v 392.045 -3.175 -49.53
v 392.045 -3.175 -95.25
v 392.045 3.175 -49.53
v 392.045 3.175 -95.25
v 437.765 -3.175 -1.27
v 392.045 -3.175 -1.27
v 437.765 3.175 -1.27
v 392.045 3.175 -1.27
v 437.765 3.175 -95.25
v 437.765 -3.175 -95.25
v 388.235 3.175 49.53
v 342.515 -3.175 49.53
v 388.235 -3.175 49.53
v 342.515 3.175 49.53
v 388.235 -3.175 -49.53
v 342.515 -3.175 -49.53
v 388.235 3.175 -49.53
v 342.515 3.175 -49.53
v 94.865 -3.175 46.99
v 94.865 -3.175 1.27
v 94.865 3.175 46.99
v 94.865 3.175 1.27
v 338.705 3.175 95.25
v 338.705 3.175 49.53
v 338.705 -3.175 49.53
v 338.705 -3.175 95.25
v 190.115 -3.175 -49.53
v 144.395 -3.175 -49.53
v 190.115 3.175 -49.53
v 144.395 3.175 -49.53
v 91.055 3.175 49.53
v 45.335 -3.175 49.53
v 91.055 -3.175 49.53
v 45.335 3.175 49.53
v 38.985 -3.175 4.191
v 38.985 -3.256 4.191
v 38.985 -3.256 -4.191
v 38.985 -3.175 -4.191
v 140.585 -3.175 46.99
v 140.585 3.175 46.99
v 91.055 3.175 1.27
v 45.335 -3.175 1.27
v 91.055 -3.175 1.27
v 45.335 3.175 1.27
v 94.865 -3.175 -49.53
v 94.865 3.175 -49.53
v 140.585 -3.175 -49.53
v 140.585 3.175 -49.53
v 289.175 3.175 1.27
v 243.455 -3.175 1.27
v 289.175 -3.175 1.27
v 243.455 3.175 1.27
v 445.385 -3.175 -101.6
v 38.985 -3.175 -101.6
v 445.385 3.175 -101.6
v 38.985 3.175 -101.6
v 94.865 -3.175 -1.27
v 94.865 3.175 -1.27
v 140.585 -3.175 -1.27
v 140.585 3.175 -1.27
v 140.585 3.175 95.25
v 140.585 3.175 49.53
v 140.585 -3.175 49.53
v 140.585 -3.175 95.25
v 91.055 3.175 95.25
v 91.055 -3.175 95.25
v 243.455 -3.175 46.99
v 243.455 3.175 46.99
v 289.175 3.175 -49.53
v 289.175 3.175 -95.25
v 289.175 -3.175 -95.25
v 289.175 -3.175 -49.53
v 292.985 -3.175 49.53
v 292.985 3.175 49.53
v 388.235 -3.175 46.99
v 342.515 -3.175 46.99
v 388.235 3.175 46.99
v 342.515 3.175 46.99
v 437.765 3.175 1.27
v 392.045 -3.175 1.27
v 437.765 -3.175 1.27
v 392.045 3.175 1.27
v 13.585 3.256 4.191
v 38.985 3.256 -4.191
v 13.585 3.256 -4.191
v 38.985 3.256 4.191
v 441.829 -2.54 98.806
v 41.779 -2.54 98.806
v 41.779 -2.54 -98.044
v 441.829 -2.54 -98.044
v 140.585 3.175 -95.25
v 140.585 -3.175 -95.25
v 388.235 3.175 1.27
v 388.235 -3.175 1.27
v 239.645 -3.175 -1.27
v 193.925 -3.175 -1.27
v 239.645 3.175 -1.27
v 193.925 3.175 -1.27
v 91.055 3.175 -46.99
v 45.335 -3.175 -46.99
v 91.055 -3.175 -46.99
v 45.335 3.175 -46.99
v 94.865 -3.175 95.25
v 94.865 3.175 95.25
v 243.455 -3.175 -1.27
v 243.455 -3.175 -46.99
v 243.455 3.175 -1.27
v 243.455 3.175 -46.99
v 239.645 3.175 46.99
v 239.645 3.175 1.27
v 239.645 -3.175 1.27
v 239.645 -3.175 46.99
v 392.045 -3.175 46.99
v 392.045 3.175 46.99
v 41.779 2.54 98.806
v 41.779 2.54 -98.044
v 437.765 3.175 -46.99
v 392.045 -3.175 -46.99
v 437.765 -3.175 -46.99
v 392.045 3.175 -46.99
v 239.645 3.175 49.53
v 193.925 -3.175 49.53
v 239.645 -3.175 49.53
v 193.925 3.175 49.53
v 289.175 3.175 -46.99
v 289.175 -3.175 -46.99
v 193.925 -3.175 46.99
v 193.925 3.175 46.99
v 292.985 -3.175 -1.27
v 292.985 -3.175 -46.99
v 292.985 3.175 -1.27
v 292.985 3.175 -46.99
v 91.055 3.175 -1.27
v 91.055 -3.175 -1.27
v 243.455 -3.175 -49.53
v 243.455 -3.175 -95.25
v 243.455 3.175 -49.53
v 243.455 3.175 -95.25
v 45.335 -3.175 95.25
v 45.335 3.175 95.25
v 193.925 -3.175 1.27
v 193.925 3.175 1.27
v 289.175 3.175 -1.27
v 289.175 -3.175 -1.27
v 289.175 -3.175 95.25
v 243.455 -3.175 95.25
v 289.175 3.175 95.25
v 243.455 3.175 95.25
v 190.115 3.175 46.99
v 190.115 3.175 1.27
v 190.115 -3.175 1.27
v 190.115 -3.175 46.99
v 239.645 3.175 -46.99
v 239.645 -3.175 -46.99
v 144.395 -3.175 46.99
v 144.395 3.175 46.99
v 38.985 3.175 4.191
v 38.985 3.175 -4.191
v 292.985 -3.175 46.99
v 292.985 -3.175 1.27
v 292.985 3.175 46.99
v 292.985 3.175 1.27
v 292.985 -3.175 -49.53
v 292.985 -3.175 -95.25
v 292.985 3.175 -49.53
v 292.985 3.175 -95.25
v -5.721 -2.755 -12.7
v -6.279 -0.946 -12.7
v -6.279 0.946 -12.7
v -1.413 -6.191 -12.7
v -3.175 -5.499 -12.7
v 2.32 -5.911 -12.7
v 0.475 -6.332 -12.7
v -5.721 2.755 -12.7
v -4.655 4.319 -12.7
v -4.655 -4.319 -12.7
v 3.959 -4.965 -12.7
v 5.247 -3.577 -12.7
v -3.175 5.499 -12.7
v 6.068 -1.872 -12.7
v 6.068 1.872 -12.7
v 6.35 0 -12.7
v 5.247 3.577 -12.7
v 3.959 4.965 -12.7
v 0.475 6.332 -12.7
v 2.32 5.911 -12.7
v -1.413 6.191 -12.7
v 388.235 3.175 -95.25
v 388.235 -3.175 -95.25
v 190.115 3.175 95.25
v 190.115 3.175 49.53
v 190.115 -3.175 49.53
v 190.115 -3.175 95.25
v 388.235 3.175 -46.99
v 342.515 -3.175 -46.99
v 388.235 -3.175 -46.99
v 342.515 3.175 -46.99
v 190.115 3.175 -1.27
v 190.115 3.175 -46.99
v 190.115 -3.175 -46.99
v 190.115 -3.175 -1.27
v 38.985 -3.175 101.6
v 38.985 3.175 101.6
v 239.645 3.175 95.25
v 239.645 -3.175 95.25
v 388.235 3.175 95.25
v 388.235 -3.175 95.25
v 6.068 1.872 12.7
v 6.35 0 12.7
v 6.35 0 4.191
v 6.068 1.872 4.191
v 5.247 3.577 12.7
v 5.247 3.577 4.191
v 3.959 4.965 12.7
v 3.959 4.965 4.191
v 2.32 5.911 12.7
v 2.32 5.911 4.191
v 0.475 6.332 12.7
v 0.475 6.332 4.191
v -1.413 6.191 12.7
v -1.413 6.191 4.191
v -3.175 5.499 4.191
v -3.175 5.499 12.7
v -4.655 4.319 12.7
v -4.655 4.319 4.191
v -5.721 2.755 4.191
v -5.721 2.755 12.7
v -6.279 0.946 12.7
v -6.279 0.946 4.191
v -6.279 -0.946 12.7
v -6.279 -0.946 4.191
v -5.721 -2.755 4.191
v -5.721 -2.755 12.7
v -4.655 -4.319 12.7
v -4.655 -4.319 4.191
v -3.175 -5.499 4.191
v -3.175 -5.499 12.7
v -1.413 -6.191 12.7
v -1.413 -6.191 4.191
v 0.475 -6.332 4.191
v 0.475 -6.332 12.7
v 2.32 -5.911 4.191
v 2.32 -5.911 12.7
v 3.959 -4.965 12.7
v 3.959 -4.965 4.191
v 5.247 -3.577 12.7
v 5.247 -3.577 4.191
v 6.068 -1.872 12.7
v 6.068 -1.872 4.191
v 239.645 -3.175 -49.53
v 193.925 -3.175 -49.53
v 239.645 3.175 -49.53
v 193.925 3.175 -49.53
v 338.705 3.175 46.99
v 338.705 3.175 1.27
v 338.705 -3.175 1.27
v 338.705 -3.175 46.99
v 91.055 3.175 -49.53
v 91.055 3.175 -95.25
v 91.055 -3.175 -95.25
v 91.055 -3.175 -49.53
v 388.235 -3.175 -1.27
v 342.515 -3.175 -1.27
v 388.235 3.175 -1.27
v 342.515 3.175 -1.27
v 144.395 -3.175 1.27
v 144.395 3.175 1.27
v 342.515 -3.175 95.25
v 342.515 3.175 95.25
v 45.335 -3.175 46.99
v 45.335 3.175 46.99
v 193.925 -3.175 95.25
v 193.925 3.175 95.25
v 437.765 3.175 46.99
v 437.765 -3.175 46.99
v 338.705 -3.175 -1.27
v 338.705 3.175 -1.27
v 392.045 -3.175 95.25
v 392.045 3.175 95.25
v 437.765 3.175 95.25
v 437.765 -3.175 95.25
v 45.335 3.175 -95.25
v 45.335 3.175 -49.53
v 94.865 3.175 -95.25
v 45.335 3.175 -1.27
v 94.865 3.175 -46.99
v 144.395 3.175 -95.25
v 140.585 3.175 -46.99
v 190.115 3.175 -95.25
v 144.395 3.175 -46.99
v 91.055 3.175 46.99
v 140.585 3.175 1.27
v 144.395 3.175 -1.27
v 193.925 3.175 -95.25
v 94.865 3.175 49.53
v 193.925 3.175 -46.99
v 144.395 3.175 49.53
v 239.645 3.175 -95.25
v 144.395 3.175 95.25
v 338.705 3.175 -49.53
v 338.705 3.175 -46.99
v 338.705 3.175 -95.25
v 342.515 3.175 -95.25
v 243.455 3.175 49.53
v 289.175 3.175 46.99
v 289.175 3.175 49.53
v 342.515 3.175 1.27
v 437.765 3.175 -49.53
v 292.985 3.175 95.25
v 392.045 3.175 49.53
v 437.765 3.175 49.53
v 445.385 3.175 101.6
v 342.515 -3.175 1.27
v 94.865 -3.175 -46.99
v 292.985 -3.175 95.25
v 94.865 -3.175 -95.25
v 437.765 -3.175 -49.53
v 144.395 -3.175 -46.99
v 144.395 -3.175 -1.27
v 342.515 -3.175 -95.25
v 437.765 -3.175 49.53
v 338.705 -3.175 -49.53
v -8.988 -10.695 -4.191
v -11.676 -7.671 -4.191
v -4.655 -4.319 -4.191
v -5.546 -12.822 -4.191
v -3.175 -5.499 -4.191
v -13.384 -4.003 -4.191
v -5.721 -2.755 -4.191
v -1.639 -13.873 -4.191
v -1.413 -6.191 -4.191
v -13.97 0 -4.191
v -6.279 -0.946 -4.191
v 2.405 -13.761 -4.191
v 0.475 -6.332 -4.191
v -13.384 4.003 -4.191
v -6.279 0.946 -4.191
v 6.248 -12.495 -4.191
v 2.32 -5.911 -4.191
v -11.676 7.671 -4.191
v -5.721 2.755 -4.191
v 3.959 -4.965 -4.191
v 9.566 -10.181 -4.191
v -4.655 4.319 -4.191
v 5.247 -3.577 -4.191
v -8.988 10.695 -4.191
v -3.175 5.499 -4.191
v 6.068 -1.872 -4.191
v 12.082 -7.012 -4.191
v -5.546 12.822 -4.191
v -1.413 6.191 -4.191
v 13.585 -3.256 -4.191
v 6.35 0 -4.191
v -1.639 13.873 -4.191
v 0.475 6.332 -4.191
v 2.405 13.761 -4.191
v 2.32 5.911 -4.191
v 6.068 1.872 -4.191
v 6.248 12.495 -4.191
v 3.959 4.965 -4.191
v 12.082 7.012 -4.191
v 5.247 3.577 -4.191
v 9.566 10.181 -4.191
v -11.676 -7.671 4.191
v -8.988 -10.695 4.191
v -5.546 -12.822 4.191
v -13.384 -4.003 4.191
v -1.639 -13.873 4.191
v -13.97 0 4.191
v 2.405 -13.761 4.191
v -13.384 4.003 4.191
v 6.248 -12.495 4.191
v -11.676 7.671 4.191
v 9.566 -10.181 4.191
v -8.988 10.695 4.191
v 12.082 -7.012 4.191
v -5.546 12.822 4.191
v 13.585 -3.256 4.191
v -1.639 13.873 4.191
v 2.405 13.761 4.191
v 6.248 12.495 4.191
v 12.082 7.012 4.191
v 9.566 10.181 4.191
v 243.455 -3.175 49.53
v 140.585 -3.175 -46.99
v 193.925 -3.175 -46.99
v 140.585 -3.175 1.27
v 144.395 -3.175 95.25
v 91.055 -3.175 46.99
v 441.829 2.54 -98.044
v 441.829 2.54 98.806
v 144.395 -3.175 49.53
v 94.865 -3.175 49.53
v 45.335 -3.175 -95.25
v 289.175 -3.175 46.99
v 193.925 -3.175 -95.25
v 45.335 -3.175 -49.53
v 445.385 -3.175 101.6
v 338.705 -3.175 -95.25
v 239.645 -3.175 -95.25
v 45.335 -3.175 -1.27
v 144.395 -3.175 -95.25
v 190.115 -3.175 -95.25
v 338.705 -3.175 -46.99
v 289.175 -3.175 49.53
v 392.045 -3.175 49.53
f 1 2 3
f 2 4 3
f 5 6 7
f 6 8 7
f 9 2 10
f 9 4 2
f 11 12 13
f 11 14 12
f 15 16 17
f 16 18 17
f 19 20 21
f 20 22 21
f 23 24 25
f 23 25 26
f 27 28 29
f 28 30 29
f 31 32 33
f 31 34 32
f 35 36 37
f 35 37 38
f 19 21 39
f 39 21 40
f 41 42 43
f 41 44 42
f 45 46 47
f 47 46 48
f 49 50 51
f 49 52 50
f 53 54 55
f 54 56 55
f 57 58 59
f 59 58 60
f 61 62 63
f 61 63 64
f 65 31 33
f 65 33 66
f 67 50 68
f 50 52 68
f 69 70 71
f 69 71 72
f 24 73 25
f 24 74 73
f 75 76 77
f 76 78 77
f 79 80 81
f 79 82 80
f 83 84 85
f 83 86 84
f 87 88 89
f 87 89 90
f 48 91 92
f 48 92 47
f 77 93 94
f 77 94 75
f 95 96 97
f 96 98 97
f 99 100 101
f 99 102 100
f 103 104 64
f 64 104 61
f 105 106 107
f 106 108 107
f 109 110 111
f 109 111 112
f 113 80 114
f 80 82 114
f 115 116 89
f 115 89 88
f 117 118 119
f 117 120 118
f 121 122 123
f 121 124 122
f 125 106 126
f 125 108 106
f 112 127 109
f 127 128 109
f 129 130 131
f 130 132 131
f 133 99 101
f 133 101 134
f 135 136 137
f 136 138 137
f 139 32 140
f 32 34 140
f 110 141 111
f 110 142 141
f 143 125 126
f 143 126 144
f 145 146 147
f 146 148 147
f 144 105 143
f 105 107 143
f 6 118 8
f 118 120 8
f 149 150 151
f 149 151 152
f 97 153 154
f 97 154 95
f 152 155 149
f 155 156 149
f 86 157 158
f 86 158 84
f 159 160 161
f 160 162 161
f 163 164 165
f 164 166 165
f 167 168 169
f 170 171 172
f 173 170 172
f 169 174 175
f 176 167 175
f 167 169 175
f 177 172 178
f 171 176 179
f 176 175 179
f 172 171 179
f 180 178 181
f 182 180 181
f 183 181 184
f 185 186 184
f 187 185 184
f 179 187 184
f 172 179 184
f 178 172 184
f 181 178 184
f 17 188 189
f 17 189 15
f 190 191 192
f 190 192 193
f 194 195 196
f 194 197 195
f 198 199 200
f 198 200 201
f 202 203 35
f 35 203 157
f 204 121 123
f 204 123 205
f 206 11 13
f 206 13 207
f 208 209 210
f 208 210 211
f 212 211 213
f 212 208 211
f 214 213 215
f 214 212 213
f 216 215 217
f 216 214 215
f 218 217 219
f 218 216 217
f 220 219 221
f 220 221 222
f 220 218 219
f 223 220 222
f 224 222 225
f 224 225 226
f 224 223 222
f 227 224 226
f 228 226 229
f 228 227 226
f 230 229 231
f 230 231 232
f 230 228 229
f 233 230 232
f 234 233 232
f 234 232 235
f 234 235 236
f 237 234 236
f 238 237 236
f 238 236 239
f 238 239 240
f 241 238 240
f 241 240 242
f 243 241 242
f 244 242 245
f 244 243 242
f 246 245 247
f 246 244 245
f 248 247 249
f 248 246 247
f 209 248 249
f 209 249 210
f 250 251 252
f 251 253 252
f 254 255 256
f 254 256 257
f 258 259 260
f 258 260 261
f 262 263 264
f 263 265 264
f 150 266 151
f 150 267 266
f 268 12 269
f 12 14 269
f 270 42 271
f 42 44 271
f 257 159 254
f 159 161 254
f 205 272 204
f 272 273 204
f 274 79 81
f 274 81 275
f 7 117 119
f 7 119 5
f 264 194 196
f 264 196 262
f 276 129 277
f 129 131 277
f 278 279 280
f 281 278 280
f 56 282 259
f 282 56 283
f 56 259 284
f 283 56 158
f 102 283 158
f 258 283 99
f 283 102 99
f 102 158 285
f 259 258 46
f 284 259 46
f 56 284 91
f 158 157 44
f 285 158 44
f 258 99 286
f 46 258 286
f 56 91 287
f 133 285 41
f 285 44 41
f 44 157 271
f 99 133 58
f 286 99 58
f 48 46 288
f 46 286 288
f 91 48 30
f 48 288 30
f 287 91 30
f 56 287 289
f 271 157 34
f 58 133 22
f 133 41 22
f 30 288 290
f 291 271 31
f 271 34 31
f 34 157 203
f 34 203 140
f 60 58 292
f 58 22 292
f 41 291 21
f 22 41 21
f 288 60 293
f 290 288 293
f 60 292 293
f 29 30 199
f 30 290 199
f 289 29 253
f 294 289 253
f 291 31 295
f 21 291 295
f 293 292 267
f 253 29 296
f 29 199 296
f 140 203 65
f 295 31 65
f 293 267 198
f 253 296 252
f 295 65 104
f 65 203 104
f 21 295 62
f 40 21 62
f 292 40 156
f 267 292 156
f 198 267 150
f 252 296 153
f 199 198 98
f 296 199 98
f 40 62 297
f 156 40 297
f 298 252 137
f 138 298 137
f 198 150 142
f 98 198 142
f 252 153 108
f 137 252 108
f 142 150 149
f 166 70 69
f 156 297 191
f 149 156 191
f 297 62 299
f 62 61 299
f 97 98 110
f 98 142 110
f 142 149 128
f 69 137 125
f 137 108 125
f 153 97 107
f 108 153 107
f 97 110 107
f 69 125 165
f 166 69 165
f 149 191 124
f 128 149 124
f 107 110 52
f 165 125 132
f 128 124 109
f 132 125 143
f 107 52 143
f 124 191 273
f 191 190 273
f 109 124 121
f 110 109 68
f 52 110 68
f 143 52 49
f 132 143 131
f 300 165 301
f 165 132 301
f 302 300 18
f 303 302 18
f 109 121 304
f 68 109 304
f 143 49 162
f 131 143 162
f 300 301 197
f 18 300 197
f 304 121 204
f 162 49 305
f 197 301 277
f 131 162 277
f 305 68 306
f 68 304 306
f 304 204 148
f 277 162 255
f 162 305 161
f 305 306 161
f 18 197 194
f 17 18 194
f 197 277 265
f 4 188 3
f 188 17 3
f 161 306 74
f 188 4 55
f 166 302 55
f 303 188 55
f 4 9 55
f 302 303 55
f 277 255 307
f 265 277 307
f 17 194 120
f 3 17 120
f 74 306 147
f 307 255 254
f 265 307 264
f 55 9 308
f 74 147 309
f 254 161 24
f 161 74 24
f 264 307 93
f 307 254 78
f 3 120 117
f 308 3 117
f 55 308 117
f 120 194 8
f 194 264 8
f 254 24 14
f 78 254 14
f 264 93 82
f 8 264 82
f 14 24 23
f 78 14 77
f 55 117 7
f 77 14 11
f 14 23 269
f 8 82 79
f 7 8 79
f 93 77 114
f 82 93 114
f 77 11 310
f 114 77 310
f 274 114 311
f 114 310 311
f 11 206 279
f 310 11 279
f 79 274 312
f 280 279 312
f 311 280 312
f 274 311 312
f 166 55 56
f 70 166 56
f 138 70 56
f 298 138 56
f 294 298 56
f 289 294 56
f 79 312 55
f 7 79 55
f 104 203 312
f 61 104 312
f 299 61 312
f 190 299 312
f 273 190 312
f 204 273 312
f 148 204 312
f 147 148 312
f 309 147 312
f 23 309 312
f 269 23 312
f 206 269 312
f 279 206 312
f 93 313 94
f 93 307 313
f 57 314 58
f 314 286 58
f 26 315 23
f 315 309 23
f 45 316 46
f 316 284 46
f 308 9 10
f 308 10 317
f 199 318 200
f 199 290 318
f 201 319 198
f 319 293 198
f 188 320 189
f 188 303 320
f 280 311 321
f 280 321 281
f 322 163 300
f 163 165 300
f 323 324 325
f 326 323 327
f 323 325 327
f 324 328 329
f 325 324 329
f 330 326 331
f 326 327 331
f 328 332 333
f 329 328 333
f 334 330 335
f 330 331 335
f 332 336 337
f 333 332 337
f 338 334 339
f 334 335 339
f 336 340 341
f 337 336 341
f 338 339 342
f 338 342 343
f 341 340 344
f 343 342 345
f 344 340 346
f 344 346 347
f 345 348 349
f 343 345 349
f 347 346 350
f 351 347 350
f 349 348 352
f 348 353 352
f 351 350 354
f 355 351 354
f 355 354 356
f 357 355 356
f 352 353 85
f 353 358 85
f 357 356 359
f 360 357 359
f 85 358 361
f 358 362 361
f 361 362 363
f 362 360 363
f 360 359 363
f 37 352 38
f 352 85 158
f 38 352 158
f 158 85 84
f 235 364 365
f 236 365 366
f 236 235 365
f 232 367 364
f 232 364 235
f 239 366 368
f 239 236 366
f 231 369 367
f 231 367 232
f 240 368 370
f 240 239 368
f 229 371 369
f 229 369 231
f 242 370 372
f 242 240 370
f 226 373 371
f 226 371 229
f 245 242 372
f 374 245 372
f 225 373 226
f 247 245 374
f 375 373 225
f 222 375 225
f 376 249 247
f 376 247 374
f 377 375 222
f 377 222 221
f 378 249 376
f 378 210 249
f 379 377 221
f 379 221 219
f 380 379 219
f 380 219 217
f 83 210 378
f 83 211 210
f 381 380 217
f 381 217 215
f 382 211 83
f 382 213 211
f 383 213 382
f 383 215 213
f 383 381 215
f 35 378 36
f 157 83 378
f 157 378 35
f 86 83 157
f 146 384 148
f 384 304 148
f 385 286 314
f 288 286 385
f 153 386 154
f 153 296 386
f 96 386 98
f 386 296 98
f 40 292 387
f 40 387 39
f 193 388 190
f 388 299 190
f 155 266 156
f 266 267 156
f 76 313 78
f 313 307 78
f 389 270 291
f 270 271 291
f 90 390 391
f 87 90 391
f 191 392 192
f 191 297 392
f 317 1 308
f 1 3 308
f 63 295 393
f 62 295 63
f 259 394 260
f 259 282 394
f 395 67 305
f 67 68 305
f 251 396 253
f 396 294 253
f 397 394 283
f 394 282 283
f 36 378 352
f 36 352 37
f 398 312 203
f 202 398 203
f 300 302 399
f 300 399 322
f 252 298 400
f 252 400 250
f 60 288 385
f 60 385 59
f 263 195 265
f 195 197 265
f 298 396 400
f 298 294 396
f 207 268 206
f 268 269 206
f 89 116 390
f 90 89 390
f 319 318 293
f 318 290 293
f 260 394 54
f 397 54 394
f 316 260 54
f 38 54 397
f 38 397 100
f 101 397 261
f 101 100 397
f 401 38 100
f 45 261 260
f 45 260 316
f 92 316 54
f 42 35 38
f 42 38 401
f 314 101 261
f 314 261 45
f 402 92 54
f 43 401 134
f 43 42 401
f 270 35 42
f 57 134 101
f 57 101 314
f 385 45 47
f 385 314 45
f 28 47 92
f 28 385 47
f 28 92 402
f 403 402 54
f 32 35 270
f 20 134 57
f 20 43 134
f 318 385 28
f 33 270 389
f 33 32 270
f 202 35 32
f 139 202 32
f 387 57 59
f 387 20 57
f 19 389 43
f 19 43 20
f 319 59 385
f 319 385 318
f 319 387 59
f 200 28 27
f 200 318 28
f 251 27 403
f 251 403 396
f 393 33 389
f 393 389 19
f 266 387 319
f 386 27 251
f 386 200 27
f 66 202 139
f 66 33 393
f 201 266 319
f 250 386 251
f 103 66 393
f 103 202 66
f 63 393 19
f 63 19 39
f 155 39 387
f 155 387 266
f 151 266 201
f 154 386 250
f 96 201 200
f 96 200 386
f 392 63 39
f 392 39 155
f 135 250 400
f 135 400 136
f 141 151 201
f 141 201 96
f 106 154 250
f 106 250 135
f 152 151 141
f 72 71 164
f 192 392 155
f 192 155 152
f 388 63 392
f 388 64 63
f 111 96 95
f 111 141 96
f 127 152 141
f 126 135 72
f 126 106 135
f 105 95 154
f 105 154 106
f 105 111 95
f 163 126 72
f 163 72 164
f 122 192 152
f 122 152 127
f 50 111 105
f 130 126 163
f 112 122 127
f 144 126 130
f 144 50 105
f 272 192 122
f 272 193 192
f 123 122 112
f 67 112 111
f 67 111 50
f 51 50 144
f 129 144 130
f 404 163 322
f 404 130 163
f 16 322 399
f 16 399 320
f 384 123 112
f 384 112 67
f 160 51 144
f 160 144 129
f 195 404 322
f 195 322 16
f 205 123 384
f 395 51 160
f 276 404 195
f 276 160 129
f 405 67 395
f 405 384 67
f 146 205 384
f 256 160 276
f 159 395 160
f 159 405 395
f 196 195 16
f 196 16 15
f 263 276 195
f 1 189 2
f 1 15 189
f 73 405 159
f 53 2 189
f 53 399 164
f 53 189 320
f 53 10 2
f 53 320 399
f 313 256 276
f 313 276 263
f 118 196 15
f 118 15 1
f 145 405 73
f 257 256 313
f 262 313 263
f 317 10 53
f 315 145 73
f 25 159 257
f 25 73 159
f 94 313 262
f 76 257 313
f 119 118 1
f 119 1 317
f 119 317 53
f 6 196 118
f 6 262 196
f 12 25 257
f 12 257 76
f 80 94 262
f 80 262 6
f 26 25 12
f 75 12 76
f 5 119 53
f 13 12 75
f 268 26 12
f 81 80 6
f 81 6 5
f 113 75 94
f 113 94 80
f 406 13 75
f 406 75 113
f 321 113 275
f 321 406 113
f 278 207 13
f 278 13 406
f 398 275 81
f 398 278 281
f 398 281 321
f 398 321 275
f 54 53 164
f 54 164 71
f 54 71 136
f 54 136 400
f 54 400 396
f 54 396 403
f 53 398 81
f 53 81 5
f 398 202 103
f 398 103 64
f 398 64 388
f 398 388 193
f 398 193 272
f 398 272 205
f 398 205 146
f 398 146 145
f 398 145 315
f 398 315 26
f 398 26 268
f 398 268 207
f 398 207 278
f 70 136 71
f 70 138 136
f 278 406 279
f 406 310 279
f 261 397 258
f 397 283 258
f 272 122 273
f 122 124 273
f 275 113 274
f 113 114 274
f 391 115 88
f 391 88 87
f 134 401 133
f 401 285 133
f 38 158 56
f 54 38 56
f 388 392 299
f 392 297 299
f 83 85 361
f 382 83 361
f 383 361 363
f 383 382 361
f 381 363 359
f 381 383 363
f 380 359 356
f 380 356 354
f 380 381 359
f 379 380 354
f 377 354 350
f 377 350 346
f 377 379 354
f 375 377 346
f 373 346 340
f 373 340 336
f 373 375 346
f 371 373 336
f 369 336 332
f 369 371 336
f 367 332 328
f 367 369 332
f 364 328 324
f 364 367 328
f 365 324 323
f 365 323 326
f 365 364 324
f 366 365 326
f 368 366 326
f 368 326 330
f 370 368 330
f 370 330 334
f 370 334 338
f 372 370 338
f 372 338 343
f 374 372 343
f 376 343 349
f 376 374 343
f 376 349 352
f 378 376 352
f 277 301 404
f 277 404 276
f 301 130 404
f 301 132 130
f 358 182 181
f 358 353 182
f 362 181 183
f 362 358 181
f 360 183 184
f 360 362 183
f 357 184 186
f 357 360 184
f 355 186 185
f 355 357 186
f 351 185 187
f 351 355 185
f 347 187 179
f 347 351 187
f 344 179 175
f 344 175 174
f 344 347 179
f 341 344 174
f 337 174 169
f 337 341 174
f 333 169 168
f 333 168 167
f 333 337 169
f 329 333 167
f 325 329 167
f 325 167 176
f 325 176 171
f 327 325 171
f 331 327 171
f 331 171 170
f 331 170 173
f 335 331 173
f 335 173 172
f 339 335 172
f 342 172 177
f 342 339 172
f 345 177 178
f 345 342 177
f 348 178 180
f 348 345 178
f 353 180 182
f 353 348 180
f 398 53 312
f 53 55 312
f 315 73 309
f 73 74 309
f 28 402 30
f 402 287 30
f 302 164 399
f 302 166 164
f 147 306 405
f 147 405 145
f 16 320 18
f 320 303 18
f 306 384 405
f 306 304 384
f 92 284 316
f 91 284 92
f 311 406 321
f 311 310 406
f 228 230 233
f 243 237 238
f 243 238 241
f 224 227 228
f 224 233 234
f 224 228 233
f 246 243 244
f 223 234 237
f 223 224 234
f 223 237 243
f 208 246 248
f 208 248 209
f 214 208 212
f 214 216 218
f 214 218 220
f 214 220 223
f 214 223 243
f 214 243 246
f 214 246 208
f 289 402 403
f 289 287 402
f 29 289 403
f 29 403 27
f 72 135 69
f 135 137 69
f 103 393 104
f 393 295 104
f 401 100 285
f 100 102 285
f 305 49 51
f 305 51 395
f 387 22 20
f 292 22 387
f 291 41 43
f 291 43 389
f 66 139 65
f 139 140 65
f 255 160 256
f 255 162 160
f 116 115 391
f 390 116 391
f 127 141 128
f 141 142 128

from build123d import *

# Parameters (mm, degrees)
F0_R      = 6.35
F1_DEPTH  = 12.7
F2_R      = 6.35
F3_DEPTH  = 4.191
F4_W      = 45.72
F4_H      = 45.72
F5_DEPTH  = 3.175
F7_W      = 400.05
F7_H      = 196.85
F8_DEPTH  = 190
F10_W     = 400.05
F10_H     = 196.85
F11_DEPTH = 5.08


with BuildPart() as f1:
    # F0 (on Top) → F1 (new body, symmetric)
    with BuildSketch(Plane.XY):
        Circle(F0_R)
    extrude(amount=F1_DEPTH, both=True)

    # F2 (on Top) → F3 (join, symmetric)
    with BuildSketch(Plane.XY):
        with BuildLine():
            Line((38.985255793, 3.2560290292), (13.585255793, 3.2560290292))
            ThreePointArc((13.585255793, 3.2560290292), (-13.97, 0), (13.585255793, -3.2560290292))
            Line((13.585255793, -3.2560290292), (38.985255793, -3.2560290292))
            Line((38.985255793, -3.2560290292), (38.985255793, 3.2560290292))
        make_face()
        Circle(F2_R, mode=Mode.SUBTRACT)
    extrude(amount=F3_DEPTH, both=True)

    # F4 (on Front) → F5 (join)
    with BuildSketch(Plane.XZ):
        Polygon((38.985255793, 101.6), (38.985255793, 4.191), (38.985255793, 0), (38.985255793, -4.191), (38.985255793, -101.6), (445.385255793, -101.6), (445.385255793, 101.6), align=None)
        with Locations((68.195255793, -72.39)):
            Rectangle(F4_W, F4_H, mode=Mode.SUBTRACT)
        with Locations((117.725255793, -72.39)):
            Rectangle(F4_W, F4_H, mode=Mode.SUBTRACT)
        with Locations((167.255255793, -72.39)):
            Rectangle(F4_W, F4_H, mode=Mode.SUBTRACT)
        with Locations((216.785255793, -72.39)):
            Rectangle(F4_W, F4_H, mode=Mode.SUBTRACT)
        with Locations((68.195255793, -24.13)):
            Rectangle(F4_W, F4_H, mode=Mode.SUBTRACT)
        with Locations((117.725255793, -24.13)):
            Rectangle(F4_W, F4_H, mode=Mode.SUBTRACT)
        with Locations((167.255255793, -24.13)):
            Rectangle(F4_W, F4_H, mode=Mode.SUBTRACT)
        with Locations((216.785255793, -24.13)):
            Rectangle(F4_W, F4_H, mode=Mode.SUBTRACT)
        with Locations((266.315255793, -72.39)):
            Rectangle(F4_W, F4_H, mode=Mode.SUBTRACT)
        with Locations((315.845255793, -72.39)):
            Rectangle(F4_W, F4_H, mode=Mode.SUBTRACT)
        with Locations((365.375255793, -72.39)):
            Rectangle(F4_W, F4_H, mode=Mode.SUBTRACT)
        with Locations((414.905255793, -72.39)):
            Rectangle(F4_W, F4_H, mode=Mode.SUBTRACT)
        with Locations((266.315255793, -24.13)):
            Rectangle(F4_W, F4_H, mode=Mode.SUBTRACT)
        with Locations((315.845255793, -24.13)):
            Rectangle(F4_W, F4_H, mode=Mode.SUBTRACT)
        with Locations((365.375255793, -24.13)):
            Rectangle(F4_W, F4_H, mode=Mode.SUBTRACT)
        with Locations((414.905255793, -24.13)):
            Rectangle(F4_W, F4_H, mode=Mode.SUBTRACT)
        with Locations((68.195255793, 24.13)):
            Rectangle(F4_W, F4_H, mode=Mode.SUBTRACT)
        with Locations((117.725255793, 24.13)):
            Rectangle(F4_W, F4_H, mode=Mode.SUBTRACT)
        with Locations((167.255255793, 24.13)):
            Rectangle(F4_W, F4_H, mode=Mode.SUBTRACT)
        with Locations((216.785255793, 24.13)):
            Rectangle(F4_W, F4_H, mode=Mode.SUBTRACT)
        with Locations((68.195255793, 72.39)):
            Rectangle(F4_W, F4_H, mode=Mode.SUBTRACT)
        with Locations((117.725255793, 72.39)):
            Rectangle(F4_W, F4_H, mode=Mode.SUBTRACT)
        with Locations((167.255255793, 72.39)):
            Rectangle(F4_W, F4_H, mode=Mode.SUBTRACT)
        with Locations((216.785255793, 72.39)):
            Rectangle(F4_W, F4_H, mode=Mode.SUBTRACT)
        with Locations((266.315255793, 24.13)):
            Rectangle(F4_W, F4_H, mode=Mode.SUBTRACT)
        with Locations((315.845255793, 24.13)):
            Rectangle(F4_W, F4_H, mode=Mode.SUBTRACT)
        with Locations((365.375255793, 24.13)):
            Rectangle(F4_W, F4_H, mode=Mode.SUBTRACT)
        with Locations((414.905255793, 24.13)):
            Rectangle(F4_W, F4_H, mode=Mode.SUBTRACT)
        with Locations((266.315255793, 72.39)):
            Rectangle(F4_W, F4_H, mode=Mode.SUBTRACT)
        with Locations((315.845255793, 72.39)):
            Rectangle(F4_W, F4_H, mode=Mode.SUBTRACT)
        with Locations((365.375255793, 72.39)):
            Rectangle(F4_W, F4_H, mode=Mode.SUBTRACT)
        with Locations((414.905255793, 72.39)):
            Rectangle(F4_W, F4_H, mode=Mode.SUBTRACT)
    extrude(amount=-F5_DEPTH)

    # F7 (on face) → F8 (cut)
    with BuildSketch(Plane.XZ):
        with Locations((241.804255793, 0.381)):
            Rectangle(F7_W, F7_H)
    extrude(amount=F8_DEPTH, mode=Mode.SUBTRACT)

    # F12: F1 across face


with BuildPart() as f11:
    # F10 (on offset) → F11 (new body)
    with BuildSketch(Plane.XZ.offset(-2.54)):
        with Locations((241.804255793, 0.381)):
            Rectangle(F10_W, F10_H)
    extrude(amount=F11_DEPTH)


with BuildPart() as f1_1:
    add(f1.part)
    add(f1.part.mirror(Plane.XZ))


solid = Compound([f11.part, f1_1.part])
